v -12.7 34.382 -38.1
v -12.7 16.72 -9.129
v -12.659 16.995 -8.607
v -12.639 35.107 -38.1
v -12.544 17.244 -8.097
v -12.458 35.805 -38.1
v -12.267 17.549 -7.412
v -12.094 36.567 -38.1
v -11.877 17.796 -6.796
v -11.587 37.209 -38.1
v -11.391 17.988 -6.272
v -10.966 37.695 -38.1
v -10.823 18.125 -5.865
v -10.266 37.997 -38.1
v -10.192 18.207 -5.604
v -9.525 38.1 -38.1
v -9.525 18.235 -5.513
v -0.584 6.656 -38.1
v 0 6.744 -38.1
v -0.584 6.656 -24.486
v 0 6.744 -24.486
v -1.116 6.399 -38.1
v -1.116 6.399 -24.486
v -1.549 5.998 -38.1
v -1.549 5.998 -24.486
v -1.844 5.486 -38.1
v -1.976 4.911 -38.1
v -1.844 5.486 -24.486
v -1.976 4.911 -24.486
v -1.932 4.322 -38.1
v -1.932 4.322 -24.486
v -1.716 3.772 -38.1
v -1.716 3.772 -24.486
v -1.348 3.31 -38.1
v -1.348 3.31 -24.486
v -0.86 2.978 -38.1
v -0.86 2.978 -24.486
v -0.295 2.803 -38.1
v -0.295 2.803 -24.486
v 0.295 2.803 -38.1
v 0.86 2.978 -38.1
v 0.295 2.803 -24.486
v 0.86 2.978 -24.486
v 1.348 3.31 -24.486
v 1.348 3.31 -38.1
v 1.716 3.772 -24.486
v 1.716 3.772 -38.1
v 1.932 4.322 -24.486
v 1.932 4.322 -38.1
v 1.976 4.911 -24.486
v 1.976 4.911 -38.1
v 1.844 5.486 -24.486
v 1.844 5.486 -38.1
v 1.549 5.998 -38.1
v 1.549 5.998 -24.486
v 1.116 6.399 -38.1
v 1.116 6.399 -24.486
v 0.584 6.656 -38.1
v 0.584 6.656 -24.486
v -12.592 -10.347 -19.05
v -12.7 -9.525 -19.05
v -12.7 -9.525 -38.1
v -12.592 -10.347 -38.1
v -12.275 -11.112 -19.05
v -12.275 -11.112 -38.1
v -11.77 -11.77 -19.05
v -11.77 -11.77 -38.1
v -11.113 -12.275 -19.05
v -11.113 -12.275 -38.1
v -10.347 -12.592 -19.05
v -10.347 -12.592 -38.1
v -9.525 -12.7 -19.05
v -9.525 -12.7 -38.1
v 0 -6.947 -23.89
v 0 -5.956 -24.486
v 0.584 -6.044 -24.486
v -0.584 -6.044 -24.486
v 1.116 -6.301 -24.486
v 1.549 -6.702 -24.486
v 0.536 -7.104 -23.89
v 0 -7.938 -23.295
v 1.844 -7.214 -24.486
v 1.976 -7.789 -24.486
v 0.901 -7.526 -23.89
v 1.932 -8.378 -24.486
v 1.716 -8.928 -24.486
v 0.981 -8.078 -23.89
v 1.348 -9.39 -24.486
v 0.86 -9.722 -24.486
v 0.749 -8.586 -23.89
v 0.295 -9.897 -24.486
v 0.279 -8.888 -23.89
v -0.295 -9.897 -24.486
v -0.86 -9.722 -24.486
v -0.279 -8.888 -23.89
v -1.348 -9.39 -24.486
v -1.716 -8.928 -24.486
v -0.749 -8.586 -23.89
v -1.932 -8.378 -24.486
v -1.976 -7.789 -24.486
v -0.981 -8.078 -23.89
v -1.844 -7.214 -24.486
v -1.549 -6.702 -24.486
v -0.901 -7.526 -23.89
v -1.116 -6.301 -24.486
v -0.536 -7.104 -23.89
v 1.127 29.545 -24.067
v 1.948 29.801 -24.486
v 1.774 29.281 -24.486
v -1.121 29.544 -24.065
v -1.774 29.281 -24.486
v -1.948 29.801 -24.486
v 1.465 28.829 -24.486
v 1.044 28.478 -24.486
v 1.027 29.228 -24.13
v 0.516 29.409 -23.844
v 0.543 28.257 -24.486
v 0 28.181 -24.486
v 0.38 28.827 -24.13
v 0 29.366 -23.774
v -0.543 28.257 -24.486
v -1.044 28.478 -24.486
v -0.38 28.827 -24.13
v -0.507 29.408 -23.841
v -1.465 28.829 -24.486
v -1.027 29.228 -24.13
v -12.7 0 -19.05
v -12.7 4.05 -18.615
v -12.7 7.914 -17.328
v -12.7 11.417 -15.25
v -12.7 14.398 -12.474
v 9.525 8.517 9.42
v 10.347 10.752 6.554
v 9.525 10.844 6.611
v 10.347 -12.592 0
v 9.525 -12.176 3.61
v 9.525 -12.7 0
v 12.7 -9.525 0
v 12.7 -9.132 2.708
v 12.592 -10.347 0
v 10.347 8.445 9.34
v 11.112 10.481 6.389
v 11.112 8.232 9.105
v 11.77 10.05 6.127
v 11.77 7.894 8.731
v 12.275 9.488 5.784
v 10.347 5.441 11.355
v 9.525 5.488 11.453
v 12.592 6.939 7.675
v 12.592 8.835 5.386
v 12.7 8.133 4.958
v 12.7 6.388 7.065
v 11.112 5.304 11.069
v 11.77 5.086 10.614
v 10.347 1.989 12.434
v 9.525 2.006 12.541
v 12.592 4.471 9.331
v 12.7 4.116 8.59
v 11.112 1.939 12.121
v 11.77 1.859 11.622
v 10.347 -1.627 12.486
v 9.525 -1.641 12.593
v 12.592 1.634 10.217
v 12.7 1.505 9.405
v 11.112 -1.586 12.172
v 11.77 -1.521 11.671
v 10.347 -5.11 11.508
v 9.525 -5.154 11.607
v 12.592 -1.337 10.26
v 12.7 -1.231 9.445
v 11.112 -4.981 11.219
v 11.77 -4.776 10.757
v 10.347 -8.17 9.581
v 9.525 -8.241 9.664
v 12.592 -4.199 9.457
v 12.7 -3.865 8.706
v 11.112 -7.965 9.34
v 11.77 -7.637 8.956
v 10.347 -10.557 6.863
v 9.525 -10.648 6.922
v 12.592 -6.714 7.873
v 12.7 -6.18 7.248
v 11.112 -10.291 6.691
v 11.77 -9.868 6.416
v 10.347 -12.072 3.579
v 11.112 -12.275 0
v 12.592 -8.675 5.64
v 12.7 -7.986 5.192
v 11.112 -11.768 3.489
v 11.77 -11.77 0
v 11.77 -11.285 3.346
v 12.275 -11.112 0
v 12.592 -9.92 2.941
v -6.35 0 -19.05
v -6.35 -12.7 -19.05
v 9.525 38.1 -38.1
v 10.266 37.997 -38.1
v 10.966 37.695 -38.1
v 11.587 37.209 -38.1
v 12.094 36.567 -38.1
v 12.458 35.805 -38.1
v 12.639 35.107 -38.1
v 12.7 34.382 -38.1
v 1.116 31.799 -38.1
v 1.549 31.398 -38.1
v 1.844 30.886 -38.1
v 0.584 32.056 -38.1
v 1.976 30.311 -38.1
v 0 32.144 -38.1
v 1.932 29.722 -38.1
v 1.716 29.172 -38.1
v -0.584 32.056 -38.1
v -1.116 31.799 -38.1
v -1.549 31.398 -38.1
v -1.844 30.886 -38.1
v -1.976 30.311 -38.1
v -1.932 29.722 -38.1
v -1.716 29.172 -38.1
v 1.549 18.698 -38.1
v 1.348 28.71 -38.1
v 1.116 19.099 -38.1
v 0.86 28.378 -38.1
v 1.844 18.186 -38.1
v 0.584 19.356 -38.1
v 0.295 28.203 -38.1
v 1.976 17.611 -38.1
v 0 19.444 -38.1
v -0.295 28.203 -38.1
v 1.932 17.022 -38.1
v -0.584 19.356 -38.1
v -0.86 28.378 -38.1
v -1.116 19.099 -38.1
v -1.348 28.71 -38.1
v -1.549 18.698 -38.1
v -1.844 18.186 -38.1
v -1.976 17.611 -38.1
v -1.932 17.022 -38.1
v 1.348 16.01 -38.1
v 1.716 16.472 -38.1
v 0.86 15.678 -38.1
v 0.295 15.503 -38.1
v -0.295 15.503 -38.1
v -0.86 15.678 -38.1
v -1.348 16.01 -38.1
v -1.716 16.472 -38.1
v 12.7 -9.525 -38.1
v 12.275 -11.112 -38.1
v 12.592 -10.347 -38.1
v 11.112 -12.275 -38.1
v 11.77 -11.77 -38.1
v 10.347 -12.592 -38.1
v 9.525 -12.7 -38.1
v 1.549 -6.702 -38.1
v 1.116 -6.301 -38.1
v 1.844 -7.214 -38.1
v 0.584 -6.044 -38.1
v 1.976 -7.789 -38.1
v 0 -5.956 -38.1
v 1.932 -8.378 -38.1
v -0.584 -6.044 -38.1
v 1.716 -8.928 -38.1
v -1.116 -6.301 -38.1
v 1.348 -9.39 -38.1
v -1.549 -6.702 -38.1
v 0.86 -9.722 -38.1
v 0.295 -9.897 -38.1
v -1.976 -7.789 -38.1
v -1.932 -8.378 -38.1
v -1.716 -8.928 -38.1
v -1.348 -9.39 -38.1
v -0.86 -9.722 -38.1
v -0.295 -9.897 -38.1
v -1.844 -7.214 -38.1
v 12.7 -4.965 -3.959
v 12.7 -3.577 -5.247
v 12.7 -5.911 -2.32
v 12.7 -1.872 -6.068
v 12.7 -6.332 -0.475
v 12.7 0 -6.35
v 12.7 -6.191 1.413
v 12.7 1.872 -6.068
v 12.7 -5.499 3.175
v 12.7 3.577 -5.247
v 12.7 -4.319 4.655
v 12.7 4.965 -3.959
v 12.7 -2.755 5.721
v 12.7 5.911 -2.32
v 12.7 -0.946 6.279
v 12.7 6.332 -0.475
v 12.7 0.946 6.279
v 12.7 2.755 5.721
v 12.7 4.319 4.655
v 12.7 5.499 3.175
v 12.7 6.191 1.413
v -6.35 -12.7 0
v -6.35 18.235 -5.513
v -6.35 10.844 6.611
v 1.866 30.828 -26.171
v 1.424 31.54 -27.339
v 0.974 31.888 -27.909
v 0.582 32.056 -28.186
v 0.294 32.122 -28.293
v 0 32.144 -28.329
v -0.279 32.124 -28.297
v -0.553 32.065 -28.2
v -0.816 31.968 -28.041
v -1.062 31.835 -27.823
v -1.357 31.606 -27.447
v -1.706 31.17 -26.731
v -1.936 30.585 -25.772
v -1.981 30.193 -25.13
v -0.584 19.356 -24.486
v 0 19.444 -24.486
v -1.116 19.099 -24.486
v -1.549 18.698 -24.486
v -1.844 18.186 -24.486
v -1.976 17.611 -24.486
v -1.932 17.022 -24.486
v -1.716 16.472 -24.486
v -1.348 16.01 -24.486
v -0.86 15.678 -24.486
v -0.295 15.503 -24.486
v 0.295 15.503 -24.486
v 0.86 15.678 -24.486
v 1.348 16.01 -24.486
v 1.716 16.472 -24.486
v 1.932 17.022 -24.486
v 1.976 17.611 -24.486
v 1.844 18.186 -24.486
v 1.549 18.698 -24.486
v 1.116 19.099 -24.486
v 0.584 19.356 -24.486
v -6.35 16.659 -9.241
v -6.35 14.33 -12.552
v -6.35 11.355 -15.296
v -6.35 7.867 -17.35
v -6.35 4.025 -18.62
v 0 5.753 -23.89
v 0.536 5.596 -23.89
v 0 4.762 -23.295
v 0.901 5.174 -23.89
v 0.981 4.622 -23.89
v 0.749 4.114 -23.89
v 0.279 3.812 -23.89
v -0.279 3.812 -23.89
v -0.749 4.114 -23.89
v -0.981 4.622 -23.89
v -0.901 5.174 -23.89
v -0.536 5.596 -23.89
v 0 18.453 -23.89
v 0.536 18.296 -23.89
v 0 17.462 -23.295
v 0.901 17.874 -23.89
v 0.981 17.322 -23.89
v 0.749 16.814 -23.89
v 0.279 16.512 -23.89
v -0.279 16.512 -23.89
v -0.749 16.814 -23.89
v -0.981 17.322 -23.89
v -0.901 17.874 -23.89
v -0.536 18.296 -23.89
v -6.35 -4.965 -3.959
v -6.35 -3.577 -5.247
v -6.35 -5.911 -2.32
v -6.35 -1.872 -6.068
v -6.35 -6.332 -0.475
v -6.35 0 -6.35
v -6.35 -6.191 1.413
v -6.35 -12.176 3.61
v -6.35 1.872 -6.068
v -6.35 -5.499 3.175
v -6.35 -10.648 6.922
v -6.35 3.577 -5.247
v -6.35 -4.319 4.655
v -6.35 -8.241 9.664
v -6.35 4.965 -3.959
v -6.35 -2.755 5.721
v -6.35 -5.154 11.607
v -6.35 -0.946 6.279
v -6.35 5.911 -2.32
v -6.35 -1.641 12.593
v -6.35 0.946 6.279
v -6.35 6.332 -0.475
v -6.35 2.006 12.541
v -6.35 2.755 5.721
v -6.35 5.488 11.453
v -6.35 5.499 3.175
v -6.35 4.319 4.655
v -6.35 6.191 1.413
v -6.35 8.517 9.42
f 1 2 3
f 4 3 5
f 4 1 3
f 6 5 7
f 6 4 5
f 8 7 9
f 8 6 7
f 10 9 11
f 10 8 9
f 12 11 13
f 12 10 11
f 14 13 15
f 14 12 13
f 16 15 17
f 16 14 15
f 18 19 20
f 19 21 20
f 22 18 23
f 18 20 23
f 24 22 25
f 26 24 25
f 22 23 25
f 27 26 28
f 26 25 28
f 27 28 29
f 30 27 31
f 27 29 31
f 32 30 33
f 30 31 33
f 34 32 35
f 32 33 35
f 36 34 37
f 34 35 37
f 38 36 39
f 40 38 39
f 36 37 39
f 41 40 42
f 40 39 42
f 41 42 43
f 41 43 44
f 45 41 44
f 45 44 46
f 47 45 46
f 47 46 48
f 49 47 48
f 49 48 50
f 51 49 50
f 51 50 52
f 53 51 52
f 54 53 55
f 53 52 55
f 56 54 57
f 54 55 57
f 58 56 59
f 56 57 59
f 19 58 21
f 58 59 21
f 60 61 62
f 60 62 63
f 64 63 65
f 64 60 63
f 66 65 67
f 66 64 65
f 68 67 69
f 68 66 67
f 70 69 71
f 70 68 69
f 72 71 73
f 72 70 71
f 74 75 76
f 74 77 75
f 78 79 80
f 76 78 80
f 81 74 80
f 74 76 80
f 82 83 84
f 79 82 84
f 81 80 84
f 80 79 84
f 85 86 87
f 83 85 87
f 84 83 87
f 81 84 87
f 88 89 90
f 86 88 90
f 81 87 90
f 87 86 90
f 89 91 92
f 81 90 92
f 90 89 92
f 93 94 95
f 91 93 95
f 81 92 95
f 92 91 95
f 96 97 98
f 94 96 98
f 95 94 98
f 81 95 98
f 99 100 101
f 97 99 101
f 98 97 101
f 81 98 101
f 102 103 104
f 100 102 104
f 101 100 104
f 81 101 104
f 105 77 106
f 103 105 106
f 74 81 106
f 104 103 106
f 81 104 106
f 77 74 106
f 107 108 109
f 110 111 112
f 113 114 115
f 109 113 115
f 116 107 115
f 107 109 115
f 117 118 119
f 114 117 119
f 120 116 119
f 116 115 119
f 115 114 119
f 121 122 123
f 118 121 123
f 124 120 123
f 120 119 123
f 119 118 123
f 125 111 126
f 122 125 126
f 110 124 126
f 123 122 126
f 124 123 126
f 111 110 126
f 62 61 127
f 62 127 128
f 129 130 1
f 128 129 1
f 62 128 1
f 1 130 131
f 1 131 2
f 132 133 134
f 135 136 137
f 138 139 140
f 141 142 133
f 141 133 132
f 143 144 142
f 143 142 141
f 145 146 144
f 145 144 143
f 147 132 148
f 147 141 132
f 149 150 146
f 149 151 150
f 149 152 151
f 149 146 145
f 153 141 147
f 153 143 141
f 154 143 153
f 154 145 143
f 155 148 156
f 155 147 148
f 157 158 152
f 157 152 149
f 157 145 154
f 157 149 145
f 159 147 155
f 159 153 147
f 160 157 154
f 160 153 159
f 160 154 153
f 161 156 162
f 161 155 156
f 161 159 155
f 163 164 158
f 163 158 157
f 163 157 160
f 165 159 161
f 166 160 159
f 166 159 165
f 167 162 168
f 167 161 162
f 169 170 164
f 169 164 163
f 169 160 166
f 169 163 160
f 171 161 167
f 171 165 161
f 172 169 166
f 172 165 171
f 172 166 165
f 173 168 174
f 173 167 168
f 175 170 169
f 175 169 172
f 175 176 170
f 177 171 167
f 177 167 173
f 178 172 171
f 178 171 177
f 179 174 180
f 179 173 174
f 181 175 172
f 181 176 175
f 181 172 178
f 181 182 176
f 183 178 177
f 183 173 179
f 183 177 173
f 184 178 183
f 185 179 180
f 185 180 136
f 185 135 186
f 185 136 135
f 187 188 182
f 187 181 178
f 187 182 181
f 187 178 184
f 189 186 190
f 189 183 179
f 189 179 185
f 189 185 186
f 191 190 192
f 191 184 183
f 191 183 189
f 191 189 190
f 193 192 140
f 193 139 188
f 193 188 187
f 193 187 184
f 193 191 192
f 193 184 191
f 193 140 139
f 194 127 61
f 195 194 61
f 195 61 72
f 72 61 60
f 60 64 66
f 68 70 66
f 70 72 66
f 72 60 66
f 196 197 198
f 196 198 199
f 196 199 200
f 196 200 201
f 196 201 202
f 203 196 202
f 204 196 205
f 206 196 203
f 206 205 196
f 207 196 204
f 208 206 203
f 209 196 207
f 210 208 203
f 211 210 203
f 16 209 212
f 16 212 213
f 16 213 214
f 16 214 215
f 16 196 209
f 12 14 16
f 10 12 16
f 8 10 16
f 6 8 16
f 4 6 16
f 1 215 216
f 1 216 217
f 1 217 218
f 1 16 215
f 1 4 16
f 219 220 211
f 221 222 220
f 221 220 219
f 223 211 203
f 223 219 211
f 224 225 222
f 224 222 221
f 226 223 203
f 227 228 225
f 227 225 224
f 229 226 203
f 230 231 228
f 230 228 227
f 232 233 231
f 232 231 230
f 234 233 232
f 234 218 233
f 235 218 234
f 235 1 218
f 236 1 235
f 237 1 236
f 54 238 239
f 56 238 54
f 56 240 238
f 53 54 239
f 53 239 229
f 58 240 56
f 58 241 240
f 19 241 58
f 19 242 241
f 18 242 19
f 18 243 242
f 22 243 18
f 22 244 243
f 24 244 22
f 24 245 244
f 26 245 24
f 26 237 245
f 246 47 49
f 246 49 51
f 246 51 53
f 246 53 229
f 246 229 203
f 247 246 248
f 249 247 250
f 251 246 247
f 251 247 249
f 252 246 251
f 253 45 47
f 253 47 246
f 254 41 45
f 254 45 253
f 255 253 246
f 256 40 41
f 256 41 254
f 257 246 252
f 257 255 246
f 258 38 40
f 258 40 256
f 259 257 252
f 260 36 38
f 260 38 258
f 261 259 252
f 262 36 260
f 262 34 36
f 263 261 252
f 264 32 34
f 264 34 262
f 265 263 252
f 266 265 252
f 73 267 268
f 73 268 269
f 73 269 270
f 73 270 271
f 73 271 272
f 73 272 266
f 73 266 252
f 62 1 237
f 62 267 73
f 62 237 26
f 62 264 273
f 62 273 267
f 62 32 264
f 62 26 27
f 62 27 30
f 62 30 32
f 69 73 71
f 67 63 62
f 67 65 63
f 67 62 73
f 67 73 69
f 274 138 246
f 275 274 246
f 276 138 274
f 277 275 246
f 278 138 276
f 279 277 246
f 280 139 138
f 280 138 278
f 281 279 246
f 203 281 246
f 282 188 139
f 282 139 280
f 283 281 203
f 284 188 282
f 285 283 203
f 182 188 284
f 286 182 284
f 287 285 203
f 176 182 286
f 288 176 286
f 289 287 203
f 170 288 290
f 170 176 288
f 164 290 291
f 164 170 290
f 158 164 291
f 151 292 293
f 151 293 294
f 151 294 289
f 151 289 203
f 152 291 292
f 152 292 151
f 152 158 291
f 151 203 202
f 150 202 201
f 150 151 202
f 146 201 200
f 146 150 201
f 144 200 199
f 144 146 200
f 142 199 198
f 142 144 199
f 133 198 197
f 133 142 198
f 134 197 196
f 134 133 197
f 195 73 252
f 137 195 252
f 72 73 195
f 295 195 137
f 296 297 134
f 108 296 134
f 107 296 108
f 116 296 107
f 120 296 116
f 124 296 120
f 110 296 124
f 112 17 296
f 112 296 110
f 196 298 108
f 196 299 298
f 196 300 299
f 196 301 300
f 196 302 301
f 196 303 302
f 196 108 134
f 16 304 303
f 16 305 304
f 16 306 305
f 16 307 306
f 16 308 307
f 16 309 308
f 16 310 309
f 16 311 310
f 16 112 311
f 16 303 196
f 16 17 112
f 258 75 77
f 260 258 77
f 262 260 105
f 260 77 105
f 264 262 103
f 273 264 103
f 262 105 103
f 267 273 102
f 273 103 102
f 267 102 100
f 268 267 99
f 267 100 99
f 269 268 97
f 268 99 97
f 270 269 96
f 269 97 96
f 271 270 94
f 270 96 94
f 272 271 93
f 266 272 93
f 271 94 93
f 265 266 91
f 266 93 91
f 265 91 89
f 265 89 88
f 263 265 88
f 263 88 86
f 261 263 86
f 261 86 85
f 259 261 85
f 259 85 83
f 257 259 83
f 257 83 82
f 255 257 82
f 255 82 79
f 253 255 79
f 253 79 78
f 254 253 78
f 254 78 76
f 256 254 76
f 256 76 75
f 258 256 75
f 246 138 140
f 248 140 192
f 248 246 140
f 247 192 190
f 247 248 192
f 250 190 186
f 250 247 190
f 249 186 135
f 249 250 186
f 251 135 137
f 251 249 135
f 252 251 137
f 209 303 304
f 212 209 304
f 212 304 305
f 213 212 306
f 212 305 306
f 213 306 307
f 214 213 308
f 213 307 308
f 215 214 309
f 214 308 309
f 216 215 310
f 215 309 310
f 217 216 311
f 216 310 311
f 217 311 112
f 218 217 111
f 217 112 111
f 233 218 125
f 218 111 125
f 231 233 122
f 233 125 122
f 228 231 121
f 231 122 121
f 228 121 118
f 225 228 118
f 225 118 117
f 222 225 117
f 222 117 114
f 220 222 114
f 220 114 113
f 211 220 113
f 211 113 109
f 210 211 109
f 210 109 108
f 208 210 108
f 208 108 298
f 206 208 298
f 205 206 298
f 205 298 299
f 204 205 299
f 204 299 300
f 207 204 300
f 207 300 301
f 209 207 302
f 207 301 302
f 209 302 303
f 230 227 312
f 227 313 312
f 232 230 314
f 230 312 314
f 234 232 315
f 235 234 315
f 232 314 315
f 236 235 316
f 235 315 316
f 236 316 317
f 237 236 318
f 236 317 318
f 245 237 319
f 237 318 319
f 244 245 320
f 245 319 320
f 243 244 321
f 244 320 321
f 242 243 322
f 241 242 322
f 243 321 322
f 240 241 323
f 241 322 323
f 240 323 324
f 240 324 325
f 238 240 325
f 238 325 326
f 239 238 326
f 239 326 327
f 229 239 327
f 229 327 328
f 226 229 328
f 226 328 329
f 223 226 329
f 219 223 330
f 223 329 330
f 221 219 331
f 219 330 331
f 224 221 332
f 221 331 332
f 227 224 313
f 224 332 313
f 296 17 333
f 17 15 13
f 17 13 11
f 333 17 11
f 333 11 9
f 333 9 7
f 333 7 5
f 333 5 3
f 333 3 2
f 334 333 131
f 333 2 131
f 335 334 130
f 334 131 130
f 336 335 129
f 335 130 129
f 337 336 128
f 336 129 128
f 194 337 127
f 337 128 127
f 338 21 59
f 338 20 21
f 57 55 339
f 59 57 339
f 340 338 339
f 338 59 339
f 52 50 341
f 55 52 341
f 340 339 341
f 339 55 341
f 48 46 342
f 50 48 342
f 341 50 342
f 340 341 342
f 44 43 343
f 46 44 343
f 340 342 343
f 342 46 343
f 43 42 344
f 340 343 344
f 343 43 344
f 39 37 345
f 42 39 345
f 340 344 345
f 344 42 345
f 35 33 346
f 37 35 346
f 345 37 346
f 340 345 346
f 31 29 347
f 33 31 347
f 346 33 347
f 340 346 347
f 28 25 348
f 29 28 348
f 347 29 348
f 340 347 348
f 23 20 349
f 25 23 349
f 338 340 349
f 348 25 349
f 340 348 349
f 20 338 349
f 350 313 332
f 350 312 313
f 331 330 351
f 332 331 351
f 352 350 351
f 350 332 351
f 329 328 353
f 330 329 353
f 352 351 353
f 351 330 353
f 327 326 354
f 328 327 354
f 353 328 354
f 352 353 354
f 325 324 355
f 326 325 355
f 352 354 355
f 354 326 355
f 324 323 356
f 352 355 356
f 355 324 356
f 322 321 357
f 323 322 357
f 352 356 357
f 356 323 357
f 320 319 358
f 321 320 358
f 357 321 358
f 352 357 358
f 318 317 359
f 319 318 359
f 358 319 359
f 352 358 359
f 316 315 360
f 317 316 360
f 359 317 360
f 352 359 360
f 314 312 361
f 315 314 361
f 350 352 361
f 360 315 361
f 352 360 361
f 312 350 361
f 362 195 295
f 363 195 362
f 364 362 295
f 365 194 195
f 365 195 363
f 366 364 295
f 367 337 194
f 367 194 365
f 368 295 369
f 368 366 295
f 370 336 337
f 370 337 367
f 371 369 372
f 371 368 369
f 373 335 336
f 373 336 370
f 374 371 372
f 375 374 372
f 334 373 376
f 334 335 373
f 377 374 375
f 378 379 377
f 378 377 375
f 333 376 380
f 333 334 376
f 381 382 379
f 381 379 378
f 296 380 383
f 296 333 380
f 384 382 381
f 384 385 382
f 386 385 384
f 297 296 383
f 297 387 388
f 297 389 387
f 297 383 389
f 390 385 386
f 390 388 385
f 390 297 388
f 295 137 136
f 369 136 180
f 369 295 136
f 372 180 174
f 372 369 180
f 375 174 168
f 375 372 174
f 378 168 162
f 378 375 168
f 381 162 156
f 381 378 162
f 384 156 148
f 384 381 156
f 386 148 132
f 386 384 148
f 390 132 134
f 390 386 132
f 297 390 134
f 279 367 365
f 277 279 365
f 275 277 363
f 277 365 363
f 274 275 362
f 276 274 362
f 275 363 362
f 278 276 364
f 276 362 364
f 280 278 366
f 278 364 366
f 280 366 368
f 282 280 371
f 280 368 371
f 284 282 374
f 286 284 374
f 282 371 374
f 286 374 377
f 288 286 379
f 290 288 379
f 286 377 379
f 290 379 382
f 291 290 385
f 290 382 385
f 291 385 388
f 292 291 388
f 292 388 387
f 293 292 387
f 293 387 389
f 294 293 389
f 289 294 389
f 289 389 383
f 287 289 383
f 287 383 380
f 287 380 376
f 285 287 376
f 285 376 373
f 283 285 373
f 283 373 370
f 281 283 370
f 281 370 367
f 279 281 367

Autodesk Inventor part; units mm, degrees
ref_plane "YZ Plane" through (0, 0, 0) normal (1, 0, 0) x (0, 1, 0)
ref_plane "XZ Plane" through (0, 0, 0) normal (0, 1, 0) x (-1, 0, 0)
ref_plane "XY Plane" through (0, 0, 0) normal (0, 0, 1) x (1, 0, 0)
sketch "Sketch2" plane through (0, 0, 0) normal (1, 0, 0) x (0, 1, 0)
  arc A0 (10.8439, 6.6106) -> (-12.7, 0) centre (0, 0) ccw
  line L0 (10.8439, 6.6106) -> (38.1, -38.1)
  line L1 (38.1, -38.1) -> (-12.7, -38.1)
  line L2 (-12.7, -38.1) -> (-12.7, 0)
  line L3 (-25.8661, 0) -> (48.761, 0) construction
  dimension "d0" = 12.7
  dimension "d1" = 50.8
  dimension "d2" = 38.1
extrude "Extrusion1" add sketch "Sketch2" along normal mid plane 25.4
sketch "Sketch4" plane through (12.7, 0, 0) normal (1, 0, 0) x (0, 0, -1)
  point P0 (0, 0)
  point P1 (0, 0)
hole "Hole1" at (12.7, 0, 0) direction (-1, 0, 0) diameter 12.7 end through all
sketch "Sketch3" plane through (-12.7, 0, 0) normal (-1, 0, 0) x (0, 0, 1)
  arc A0 (-5.5133, 18.2348) -> (-19.05, 0) centre (0, 0) ccw
  circle A1 centre (0, 0) radius 6.35 construction
  arc A2 (0, -12.7) -> (6.6106, 10.8439) centre (0, 0) ccw projected
  line L0 (6.6106, 10.8439) -> (-38.1, 38.1) projected
  line L1 (-38.1, 38.1) -> (-38.1, -12.7) construction
  line L2 (-38.1, -12.7) -> (0, -12.7) projected
  line L3 (-19.05, 0) -> (-19.05, -12.7)
  dimension "d5" = 38.1
extrude "Extrusion2" cut sketch "Sketch3" against normal blind 6.35
sketch "Sketch5" plane through (12.7, 38.1, -38.1) normal (0, 0, -1) x (-1, 0, 0)
  line L0 (12.7, -60.96) -> (12.7, 10.16) construction
  point P0 (12.7, -38.1)
  point P1 (12.7, -46.0375)
  dimension "d15" = 7.9375
hole "Hole2" at (0, -7.9375, -38.1) direction (0, 0, 1) diameter 3.9624 depth 13.6144 tip angle 118 thread size "10-32 UNF" class "2B" standard "ANSI Unified Screw Threads"
pattern_linear "Rectangular Pattern1" count 4 spacing 12.7 along (0, 1, 0) of "Hole2"
fillet "Fillet1" radius 3.175 5 edges at (12.7, -3.4331, 12.2272) (12.7, -12.7, -19.05) (12.7, 24.472, -15.7447) (-12.7, 28.1674, -21.8066) (-12.7, -12.7, -28.575)
properties part number "MOUNT,SPRING,ELEVATOR" material "3D Print Material - chopped carbon Nylon12 (preferred)"
